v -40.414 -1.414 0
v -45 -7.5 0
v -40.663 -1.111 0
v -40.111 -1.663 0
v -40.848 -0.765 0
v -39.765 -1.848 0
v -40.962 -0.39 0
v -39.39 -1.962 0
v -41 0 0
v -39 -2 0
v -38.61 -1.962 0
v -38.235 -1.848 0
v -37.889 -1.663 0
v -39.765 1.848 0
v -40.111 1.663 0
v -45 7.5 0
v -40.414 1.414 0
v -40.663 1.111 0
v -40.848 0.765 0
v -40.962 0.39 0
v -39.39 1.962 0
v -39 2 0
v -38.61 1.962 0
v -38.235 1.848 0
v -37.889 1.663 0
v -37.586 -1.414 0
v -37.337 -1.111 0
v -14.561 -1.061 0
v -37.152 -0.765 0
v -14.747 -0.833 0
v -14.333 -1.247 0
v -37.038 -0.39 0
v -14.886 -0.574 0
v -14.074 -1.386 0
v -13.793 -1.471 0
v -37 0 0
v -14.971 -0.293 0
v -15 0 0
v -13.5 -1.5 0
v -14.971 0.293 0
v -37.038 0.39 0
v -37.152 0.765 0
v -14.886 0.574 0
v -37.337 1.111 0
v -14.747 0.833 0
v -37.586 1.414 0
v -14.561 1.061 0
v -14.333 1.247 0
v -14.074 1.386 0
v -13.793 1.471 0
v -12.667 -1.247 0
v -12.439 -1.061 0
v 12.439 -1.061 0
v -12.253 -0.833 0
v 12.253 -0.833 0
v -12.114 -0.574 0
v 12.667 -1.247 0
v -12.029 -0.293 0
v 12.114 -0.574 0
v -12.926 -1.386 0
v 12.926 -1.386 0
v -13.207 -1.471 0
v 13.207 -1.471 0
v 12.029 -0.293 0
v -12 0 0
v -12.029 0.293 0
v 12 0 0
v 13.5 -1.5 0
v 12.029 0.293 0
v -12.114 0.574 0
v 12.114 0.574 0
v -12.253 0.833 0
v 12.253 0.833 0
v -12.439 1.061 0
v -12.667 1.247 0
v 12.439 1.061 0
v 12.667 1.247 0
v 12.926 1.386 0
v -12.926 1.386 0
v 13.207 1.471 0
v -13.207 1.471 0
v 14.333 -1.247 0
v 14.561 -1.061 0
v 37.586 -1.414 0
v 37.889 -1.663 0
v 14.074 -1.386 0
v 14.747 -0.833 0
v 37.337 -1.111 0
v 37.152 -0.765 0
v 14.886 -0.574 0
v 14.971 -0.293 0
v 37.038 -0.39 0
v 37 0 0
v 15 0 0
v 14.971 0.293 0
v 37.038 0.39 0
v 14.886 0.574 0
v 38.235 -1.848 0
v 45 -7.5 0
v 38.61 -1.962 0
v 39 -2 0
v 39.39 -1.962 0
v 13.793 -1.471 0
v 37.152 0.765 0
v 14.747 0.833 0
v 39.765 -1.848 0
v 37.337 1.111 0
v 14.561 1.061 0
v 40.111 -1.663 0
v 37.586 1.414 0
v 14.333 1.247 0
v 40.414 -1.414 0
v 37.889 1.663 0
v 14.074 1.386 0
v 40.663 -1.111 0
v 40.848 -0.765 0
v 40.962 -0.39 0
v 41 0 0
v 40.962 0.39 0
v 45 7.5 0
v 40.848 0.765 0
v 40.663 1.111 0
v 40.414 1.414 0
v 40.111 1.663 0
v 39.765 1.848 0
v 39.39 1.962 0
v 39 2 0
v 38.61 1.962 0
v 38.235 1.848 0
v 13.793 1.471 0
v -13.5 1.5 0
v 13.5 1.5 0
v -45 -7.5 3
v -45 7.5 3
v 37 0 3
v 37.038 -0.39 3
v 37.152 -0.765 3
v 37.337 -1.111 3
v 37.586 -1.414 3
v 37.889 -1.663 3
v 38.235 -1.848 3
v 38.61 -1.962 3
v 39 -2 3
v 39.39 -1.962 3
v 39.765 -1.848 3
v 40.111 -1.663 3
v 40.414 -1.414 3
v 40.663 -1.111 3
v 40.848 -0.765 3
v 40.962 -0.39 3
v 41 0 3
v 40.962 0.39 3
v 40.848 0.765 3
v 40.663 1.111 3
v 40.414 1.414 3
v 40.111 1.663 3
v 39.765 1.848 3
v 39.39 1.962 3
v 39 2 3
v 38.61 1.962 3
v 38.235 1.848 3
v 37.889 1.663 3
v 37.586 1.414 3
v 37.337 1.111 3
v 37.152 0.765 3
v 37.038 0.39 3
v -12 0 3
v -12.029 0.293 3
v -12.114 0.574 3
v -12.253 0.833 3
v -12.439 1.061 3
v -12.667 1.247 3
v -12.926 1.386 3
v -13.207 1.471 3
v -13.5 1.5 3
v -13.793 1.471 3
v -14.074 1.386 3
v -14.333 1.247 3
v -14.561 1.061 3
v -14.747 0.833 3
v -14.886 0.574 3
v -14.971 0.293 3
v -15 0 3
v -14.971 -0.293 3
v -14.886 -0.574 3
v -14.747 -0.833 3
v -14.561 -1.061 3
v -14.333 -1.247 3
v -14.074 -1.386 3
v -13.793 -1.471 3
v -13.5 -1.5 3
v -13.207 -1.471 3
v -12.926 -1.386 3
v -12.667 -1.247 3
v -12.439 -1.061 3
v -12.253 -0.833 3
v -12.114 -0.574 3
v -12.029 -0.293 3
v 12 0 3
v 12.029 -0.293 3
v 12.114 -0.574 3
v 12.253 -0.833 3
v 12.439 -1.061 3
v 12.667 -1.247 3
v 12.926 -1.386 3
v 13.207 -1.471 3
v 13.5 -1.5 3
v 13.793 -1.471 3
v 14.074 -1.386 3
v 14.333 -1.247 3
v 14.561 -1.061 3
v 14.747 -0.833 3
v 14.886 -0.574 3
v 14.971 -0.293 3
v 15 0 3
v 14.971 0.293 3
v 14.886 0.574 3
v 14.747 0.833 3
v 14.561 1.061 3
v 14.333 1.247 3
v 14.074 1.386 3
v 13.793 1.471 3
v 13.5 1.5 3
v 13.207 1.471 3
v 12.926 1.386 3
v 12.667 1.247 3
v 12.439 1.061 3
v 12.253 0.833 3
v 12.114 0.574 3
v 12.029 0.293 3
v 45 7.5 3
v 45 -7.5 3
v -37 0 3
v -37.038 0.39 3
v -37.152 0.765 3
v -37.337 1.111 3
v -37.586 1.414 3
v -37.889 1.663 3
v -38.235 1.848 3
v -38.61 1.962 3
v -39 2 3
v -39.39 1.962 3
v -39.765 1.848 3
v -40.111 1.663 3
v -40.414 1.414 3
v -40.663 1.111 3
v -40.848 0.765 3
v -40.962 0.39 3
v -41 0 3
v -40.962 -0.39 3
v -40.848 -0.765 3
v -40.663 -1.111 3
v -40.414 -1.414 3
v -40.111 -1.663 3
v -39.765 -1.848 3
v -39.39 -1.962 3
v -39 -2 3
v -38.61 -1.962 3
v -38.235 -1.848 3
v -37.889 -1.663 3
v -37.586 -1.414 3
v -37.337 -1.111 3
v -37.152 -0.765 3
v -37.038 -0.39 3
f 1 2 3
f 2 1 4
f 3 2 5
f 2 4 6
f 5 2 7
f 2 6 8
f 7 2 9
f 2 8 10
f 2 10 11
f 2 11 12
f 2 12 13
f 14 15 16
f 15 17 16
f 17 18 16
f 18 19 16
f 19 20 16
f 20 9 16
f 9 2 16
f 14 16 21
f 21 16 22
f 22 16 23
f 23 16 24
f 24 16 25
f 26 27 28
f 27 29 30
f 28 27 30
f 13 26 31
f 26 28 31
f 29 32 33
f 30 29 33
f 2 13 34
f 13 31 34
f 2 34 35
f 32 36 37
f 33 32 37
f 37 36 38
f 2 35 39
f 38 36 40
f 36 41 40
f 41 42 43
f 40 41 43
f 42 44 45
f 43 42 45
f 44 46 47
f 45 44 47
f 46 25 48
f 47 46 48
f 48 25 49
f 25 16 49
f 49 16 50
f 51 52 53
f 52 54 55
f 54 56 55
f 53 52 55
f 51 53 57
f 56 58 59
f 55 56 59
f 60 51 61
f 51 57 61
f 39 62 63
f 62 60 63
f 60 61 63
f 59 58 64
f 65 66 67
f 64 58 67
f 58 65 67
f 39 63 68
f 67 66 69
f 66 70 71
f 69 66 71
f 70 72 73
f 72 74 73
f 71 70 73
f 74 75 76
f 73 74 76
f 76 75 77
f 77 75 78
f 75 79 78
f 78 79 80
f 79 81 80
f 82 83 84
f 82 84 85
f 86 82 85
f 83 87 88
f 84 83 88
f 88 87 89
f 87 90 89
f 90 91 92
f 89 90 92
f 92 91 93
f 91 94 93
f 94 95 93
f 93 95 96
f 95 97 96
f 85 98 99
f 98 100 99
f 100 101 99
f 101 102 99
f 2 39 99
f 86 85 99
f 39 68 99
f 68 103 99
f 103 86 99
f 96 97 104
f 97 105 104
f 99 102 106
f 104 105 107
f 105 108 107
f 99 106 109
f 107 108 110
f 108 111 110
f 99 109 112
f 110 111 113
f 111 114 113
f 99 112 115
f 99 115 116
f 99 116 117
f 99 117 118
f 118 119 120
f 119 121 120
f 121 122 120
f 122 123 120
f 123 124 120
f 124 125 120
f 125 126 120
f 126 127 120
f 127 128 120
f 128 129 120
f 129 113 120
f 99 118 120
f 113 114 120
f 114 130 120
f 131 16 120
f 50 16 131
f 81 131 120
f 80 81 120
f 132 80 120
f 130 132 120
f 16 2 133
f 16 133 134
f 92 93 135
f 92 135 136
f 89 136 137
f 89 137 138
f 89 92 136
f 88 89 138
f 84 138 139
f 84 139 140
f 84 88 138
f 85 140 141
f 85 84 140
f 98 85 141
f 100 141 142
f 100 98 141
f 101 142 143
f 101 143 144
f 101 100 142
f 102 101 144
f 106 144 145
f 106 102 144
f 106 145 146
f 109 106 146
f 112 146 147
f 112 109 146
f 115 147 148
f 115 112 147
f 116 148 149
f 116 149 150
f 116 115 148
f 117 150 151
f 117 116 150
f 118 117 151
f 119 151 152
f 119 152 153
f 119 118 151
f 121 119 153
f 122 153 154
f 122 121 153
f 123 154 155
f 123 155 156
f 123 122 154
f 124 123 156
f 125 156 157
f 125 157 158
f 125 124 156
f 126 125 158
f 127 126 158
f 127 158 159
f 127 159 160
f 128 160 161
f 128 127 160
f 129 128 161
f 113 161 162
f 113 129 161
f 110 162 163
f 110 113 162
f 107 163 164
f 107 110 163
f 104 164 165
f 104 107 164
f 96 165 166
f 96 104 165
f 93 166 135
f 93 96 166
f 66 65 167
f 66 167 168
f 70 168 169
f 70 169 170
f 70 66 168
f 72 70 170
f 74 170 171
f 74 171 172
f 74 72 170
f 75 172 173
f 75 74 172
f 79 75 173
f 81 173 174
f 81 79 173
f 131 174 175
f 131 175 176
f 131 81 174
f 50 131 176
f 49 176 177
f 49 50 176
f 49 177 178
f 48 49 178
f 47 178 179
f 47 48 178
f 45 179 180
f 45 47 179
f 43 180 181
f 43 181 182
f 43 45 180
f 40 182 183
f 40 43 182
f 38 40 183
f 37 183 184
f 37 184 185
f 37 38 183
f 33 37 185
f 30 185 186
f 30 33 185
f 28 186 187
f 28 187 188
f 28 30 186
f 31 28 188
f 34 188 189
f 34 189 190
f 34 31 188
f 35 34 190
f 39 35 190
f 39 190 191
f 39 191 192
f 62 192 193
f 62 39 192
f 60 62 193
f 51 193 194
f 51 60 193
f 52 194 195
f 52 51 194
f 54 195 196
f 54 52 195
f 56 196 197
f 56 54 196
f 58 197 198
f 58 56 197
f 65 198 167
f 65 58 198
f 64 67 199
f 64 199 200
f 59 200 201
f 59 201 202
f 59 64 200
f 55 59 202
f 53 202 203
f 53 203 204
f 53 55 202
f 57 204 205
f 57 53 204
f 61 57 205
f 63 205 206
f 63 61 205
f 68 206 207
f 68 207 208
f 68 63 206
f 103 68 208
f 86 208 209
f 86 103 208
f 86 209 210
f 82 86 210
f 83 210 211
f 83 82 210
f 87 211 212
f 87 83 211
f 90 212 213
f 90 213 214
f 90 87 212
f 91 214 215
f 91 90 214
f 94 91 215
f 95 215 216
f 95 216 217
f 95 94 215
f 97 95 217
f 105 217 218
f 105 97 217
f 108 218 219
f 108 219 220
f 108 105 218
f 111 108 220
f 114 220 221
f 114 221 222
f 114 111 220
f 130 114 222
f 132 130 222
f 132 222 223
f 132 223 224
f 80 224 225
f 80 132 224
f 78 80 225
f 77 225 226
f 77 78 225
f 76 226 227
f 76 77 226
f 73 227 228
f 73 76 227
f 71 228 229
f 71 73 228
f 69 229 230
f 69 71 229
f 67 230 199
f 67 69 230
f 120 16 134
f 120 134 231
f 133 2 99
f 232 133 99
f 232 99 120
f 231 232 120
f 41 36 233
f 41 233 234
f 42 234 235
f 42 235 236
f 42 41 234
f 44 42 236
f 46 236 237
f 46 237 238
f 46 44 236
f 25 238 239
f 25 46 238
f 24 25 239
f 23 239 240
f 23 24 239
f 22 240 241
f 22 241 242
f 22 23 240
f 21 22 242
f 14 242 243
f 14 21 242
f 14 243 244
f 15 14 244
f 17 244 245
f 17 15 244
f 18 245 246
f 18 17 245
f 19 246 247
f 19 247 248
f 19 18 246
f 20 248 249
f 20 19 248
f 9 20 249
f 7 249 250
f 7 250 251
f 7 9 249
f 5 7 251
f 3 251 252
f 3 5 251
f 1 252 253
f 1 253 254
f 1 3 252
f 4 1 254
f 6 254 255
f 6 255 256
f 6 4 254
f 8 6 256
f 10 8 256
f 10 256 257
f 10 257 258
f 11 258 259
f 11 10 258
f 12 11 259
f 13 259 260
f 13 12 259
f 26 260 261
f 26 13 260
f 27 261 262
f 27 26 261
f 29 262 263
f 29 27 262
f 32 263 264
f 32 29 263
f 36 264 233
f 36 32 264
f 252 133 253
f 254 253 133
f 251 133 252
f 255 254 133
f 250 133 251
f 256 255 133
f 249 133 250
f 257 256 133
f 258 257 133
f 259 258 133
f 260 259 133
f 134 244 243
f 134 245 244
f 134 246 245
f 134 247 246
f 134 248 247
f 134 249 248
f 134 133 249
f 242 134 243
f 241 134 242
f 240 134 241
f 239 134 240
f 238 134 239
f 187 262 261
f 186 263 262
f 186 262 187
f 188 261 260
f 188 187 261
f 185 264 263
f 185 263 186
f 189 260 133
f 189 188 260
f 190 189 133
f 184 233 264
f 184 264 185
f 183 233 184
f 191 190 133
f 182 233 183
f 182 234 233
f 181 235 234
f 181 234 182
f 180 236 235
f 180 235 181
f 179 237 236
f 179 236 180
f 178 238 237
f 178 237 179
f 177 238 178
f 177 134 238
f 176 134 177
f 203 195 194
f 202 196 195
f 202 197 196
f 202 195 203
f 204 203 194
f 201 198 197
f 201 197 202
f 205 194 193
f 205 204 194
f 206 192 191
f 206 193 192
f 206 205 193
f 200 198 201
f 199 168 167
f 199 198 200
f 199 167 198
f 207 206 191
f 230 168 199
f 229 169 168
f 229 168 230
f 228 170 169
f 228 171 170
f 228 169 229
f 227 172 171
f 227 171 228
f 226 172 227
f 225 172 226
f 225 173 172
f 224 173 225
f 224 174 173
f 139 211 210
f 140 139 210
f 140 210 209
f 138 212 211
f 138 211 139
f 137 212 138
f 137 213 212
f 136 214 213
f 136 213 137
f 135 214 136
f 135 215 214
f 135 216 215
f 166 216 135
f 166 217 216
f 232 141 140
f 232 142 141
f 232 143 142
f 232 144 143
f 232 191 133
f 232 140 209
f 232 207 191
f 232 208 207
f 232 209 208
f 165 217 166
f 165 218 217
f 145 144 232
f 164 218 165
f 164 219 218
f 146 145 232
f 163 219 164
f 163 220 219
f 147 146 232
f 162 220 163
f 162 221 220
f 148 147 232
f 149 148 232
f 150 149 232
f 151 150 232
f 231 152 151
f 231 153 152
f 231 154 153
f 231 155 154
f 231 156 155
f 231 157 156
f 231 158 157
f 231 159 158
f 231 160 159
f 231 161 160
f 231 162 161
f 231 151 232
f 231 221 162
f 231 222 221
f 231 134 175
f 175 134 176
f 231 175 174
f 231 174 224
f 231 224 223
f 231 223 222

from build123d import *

# Parameters (mm, degrees)
SKETCH_1_W      = 90
SKETCH_1_H      = 15
SKETCH_1_R      = 1.5
SKETCH_1_R_2    = 2
EXTRUDE_1_DEPTH = 3


with BuildPart() as part:
    # 草图1 → 凸台-拉伸1 (new body)
    with BuildSketch(Plane.XY):
        Rectangle(SKETCH_1_W, SKETCH_1_H)
        with Locations((-13.5, 0)):
            Circle(SKETCH_1_R, mode=Mode.SUBTRACT)
        with Locations(Location((13.5, 0, 0), (0, 0, 180))):
            Circle(SKETCH_1_R, mode=Mode.SUBTRACT)
        with Locations((-39, 0)):
            Circle(SKETCH_1_R_2, mode=Mode.SUBTRACT)
        with Locations(Location((39, 0, 0), (0, 0, 180))):
            Circle(SKETCH_1_R_2, mode=Mode.SUBTRACT)
    extrude(amount=EXTRUDE_1_DEPTH)


solid = part.part
